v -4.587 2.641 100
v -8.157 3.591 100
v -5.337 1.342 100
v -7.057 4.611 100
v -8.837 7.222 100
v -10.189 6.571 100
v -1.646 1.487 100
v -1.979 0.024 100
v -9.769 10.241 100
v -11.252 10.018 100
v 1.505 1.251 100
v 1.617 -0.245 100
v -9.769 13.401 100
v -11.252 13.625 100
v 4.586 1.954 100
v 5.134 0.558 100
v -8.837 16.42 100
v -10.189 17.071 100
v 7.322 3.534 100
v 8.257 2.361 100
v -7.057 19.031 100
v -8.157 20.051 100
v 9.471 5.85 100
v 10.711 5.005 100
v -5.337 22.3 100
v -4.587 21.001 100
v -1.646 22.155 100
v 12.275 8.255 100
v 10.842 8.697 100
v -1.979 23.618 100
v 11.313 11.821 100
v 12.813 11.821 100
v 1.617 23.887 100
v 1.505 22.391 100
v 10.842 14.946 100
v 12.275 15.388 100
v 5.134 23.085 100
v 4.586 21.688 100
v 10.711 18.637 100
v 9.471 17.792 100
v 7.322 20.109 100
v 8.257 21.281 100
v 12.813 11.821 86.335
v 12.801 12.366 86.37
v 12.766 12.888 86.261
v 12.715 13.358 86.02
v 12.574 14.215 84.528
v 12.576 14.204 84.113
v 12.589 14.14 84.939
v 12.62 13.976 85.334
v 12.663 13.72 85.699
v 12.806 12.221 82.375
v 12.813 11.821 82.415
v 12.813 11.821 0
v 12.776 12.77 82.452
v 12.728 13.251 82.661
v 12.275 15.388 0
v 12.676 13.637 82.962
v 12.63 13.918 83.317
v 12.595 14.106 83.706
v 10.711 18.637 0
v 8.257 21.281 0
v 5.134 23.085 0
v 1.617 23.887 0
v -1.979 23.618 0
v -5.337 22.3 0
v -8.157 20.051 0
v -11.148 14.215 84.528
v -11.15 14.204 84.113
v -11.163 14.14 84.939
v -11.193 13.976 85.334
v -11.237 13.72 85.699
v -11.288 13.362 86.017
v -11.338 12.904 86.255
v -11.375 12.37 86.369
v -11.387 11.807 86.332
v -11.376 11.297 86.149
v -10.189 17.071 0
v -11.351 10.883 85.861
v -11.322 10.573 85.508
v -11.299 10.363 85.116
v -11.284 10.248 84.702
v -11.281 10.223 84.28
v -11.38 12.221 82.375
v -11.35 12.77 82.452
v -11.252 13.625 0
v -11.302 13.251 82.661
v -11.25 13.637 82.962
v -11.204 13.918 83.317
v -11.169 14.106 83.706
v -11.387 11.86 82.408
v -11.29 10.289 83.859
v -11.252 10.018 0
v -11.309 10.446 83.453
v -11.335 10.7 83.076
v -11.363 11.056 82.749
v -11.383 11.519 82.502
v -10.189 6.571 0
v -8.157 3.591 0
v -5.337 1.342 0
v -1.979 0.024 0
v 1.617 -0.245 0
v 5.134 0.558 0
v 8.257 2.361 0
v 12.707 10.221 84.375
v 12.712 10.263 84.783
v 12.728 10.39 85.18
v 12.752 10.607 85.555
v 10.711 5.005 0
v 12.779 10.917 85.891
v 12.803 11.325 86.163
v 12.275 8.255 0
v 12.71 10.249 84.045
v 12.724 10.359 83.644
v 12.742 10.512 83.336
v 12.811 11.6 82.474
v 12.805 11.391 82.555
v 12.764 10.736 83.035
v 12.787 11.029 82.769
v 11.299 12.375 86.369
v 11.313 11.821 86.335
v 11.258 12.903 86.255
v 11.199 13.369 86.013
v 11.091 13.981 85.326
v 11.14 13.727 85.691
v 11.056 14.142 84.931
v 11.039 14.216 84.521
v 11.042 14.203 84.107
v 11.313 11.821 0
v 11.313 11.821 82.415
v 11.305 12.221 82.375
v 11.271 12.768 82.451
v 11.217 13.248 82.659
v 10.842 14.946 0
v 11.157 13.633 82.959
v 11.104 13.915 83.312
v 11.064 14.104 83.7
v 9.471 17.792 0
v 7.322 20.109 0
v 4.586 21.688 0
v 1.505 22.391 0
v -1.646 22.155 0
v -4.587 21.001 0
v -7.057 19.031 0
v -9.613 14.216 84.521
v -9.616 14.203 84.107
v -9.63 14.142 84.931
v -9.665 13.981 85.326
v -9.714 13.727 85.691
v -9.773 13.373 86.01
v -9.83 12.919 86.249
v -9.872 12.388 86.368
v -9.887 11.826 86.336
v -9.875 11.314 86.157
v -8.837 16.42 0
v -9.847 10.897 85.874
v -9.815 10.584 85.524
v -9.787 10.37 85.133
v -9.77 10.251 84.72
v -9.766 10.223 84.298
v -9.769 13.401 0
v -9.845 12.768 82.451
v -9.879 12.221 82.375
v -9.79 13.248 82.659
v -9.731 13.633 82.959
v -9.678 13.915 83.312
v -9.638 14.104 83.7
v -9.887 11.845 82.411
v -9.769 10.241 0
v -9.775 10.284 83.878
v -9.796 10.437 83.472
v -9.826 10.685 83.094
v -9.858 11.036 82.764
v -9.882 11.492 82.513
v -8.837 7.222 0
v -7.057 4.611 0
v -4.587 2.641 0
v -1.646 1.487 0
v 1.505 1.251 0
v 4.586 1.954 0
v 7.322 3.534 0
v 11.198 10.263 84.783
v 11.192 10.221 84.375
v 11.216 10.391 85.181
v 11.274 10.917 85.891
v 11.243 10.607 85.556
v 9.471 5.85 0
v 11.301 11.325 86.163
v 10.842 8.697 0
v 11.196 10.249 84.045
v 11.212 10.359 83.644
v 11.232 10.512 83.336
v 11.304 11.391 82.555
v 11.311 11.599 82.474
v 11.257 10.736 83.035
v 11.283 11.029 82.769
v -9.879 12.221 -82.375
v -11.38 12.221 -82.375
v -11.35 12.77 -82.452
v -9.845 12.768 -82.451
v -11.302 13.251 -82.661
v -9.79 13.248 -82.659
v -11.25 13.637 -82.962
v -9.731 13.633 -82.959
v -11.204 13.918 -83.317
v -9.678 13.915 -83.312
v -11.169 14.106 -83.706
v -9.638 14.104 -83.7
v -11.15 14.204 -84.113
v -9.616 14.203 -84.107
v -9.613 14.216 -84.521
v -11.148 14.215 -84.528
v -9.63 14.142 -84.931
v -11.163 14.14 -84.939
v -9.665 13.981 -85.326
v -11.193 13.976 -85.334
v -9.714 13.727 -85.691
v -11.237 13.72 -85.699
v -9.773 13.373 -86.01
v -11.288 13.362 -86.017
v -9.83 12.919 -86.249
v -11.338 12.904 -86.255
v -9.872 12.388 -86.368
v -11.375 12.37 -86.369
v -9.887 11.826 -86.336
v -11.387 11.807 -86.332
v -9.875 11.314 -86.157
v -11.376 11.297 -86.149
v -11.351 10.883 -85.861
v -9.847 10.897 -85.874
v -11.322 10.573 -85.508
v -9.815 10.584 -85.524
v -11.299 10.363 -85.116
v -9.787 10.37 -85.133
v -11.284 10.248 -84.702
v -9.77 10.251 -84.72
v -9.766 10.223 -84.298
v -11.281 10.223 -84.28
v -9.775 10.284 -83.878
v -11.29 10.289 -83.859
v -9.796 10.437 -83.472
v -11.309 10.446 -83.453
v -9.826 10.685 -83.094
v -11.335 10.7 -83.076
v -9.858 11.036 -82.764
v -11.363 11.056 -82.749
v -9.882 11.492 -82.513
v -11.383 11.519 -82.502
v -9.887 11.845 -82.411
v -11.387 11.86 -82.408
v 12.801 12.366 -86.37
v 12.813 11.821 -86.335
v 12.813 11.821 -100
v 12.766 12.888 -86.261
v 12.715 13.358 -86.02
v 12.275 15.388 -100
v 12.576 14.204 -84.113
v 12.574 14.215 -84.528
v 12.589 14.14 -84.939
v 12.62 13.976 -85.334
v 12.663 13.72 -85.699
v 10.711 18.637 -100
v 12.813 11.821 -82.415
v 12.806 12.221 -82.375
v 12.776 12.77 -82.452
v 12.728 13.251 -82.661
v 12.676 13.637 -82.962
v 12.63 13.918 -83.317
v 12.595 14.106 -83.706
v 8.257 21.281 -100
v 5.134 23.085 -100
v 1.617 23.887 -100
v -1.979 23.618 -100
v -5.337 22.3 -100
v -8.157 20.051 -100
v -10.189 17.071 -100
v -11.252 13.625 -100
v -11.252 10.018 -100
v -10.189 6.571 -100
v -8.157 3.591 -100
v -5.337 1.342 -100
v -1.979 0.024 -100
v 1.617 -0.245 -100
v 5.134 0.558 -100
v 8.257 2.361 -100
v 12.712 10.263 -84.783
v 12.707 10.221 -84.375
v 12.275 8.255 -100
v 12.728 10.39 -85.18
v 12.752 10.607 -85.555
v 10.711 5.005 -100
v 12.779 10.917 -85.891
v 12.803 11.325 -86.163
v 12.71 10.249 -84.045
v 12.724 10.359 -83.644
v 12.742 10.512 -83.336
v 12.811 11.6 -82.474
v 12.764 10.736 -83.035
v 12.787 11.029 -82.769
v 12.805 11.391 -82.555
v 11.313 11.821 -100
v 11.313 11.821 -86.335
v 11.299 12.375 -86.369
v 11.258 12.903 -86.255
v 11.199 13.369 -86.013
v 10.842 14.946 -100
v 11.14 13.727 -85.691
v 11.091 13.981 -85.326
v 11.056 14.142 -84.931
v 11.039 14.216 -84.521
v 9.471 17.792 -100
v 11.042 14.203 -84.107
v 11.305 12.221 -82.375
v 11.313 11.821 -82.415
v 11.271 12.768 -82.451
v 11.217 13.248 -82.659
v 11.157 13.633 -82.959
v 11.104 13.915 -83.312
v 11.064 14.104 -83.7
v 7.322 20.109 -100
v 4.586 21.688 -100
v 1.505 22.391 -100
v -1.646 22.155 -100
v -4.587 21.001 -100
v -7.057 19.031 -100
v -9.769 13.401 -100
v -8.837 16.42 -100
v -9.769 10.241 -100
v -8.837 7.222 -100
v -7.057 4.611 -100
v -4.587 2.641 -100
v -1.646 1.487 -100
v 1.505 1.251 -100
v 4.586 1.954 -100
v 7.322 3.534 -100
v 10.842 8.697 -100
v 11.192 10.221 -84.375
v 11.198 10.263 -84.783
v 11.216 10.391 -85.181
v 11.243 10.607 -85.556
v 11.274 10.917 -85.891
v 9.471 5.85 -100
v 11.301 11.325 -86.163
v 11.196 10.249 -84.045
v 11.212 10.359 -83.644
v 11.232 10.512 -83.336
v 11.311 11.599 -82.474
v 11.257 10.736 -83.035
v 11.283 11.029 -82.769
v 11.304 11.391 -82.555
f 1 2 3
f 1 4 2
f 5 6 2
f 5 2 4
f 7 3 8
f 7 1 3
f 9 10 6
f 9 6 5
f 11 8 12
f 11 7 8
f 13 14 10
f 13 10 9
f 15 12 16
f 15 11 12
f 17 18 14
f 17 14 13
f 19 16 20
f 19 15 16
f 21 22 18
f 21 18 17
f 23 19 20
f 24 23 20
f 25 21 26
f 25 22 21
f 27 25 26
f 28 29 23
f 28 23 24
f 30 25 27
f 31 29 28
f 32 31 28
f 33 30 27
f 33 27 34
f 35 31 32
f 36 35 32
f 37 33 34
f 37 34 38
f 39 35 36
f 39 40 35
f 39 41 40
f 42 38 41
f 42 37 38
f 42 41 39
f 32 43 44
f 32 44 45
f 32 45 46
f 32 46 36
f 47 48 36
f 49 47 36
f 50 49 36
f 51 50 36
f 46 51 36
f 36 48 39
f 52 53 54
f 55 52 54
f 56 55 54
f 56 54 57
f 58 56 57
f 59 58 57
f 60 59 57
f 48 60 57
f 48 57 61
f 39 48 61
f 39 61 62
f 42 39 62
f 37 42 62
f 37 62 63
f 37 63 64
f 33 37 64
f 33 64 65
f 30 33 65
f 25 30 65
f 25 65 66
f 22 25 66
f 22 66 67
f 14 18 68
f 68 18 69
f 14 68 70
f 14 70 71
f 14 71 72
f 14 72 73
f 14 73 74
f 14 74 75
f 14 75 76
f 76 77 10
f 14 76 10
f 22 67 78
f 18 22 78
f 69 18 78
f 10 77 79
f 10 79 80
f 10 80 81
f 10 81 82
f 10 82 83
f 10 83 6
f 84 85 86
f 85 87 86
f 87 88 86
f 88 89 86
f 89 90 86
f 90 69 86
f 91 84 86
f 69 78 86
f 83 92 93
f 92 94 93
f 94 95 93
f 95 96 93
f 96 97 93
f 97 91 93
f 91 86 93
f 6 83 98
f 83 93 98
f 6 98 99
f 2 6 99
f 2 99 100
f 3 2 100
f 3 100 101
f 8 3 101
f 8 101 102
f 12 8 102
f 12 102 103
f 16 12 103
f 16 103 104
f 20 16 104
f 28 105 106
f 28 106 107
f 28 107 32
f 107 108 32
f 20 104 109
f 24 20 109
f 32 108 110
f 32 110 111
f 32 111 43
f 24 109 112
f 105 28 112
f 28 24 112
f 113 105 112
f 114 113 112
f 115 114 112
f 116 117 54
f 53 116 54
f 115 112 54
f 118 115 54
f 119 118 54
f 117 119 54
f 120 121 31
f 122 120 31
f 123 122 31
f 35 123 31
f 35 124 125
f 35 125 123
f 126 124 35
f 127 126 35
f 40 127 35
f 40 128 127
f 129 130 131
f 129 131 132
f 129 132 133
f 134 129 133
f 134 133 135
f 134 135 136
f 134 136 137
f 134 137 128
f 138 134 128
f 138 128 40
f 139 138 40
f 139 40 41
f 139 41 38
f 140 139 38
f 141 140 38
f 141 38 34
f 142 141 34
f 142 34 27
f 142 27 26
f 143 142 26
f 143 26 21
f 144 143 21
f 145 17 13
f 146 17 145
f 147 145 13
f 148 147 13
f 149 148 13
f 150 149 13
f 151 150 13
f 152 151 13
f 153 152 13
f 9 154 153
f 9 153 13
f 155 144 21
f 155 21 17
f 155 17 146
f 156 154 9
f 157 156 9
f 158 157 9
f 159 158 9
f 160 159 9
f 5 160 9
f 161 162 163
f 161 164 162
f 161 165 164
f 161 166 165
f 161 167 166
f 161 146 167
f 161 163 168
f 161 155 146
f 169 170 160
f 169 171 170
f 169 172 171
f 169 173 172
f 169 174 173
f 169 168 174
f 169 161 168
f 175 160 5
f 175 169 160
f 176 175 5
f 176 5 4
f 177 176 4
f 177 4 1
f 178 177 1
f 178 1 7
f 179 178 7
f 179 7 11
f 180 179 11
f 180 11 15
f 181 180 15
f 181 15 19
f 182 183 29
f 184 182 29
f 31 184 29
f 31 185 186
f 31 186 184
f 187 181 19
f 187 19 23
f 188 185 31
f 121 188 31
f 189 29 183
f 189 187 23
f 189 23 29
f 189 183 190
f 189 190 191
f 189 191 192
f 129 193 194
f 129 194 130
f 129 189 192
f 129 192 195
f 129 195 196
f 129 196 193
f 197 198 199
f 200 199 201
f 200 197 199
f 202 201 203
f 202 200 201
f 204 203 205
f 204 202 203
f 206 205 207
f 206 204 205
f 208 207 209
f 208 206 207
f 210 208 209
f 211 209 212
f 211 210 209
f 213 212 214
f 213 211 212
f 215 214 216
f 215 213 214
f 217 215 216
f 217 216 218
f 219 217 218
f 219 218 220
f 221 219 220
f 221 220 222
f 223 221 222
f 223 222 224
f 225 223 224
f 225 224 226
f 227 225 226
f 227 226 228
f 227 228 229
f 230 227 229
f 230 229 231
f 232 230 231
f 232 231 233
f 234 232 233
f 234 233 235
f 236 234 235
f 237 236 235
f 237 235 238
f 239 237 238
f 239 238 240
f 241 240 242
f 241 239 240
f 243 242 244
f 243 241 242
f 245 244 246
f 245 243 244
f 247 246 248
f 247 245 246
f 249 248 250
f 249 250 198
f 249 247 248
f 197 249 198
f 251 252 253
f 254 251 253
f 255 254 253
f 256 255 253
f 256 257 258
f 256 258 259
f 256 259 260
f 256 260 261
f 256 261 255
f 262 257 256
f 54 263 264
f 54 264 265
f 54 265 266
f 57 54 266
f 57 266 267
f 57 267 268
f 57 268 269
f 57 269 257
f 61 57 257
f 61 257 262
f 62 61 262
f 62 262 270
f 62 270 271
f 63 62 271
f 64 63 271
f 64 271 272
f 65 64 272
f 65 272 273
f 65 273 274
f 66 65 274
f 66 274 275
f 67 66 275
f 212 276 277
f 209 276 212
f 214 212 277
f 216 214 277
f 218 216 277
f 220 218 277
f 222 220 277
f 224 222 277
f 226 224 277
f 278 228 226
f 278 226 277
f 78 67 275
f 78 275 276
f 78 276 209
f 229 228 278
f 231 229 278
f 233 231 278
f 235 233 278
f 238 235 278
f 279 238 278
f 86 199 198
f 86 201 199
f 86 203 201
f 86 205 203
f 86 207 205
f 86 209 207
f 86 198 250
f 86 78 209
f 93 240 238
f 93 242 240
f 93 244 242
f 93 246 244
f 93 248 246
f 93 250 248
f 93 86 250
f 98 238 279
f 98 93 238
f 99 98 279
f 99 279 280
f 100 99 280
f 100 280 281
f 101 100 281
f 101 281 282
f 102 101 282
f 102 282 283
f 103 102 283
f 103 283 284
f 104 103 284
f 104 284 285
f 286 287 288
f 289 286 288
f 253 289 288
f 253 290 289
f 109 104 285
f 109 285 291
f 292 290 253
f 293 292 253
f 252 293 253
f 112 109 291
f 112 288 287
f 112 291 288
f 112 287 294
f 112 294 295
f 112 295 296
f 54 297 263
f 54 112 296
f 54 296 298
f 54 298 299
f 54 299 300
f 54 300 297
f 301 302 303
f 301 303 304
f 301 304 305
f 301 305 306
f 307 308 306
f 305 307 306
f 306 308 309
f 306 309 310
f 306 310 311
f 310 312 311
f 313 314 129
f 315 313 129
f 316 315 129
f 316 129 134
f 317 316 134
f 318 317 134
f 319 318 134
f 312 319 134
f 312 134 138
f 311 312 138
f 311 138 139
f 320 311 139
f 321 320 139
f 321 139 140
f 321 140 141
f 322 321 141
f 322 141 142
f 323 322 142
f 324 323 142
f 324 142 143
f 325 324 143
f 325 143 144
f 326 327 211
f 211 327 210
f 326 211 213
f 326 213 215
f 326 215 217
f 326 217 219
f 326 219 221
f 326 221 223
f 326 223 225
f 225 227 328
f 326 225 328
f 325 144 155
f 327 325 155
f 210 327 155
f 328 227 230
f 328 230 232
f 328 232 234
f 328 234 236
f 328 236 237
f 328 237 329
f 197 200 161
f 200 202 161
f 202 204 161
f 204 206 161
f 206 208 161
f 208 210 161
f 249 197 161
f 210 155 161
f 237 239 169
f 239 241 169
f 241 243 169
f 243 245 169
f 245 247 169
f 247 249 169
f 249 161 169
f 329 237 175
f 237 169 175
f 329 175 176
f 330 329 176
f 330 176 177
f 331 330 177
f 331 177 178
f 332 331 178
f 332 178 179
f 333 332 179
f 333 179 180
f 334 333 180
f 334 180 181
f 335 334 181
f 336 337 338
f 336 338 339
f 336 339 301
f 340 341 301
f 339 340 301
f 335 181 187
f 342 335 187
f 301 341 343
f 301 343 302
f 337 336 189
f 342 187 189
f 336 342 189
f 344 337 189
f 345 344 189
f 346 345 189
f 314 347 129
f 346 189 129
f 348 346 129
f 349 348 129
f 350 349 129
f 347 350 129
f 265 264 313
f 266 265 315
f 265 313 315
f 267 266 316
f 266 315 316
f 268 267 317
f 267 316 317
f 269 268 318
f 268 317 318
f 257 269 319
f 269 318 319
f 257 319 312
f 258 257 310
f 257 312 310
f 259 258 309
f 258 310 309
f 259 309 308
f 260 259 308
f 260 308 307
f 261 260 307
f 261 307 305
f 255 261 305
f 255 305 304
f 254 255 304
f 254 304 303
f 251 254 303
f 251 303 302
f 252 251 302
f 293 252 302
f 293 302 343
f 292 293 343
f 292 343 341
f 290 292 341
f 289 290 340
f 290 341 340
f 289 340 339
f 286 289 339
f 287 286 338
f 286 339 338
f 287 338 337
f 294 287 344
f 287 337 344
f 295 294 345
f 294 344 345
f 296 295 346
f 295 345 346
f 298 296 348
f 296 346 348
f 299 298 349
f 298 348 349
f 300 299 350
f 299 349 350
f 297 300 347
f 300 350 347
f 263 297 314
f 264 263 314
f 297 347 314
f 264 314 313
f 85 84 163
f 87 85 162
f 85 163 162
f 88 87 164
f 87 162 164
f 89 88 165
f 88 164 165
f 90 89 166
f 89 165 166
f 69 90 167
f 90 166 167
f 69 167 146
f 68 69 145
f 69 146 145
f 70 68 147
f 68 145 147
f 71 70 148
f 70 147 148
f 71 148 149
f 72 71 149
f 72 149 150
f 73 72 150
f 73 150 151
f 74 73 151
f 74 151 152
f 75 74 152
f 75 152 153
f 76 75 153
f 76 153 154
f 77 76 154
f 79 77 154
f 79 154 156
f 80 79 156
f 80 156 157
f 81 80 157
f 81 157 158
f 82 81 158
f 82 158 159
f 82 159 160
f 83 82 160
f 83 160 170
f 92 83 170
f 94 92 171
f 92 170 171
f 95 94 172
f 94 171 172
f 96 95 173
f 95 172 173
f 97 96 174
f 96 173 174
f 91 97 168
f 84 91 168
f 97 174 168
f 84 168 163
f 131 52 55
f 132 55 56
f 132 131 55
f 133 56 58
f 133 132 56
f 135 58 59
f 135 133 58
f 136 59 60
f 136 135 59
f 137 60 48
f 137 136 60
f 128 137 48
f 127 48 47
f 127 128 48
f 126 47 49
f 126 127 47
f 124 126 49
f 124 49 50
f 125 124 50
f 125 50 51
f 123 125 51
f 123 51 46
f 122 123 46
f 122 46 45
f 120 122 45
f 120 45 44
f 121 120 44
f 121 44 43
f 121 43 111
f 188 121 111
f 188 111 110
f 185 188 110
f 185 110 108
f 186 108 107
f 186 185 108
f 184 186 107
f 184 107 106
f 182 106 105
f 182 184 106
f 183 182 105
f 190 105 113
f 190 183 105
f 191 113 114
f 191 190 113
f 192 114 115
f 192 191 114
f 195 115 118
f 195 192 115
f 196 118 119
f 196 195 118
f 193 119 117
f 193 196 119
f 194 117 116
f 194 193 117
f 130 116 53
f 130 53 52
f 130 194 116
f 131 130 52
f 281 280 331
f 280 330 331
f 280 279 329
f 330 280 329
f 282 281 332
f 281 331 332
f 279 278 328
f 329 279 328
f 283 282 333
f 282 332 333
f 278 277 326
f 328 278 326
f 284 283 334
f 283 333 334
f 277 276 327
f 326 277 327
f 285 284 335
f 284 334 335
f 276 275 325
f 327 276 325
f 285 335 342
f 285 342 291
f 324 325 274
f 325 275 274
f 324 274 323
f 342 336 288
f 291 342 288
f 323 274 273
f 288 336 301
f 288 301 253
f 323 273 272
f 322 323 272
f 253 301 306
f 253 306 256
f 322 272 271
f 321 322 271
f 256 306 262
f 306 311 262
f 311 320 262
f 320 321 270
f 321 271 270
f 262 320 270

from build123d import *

# Parameters (mm, degrees)
SKETCH1_R           = 12.1
SKETCH1_R_2         = 10.6
BOSS_EXTRUDE1_DEPTH = 100
SKETCH8_R           = 2
CUT_EXTRUDE2_DEPTH  = 104.616567834


with BuildPart() as part:
    # Sketch1 → Boss-Extrude1 (new body)
    with BuildSketch(Plane.XY):
        with Locations((0.713024601, 11.821110558)):
            Circle(SKETCH1_R)
        with Locations((0.713024601, 11.821110558)):
            Circle(SKETCH1_R_2, mode=Mode.SUBTRACT)
    boss_extrude1 = extrude(amount=BOSS_EXTRUDE1_DEPTH)

    # Sketch8 → Cut-Extrude2 (cut, symmetric)
    with BuildSketch(Plane(origin=(0, 0, 0), x_dir=(0, 0, -1), z_dir=(1, 0, 0))):
        with Locations((-84.375, 12.221110558)):
            Circle(SKETCH8_R)
        with Locations((-151.625, 12.221110558)):
            Circle(SKETCH8_R)
    cut_extrude2 = extrude(amount=CUT_EXTRUDE2_DEPTH, both=True, mode=Mode.SUBTRACT)

    # Mirror1: Boss-Extrude1, Cut-Extrude2 across plane
    add(boss_extrude1.mirror(Plane(origin=(0.713024601, 11.821110558, 0), x_dir=(1, 0, 0), z_dir=(0, 0, 1))))
    add(cut_extrude2.mirror(Plane(origin=(0.713024601, 11.821110558, 0), x_dir=(1, 0, 0), z_dir=(0, 0, 1))), mode=Mode.SUBTRACT)


solid = part.part
